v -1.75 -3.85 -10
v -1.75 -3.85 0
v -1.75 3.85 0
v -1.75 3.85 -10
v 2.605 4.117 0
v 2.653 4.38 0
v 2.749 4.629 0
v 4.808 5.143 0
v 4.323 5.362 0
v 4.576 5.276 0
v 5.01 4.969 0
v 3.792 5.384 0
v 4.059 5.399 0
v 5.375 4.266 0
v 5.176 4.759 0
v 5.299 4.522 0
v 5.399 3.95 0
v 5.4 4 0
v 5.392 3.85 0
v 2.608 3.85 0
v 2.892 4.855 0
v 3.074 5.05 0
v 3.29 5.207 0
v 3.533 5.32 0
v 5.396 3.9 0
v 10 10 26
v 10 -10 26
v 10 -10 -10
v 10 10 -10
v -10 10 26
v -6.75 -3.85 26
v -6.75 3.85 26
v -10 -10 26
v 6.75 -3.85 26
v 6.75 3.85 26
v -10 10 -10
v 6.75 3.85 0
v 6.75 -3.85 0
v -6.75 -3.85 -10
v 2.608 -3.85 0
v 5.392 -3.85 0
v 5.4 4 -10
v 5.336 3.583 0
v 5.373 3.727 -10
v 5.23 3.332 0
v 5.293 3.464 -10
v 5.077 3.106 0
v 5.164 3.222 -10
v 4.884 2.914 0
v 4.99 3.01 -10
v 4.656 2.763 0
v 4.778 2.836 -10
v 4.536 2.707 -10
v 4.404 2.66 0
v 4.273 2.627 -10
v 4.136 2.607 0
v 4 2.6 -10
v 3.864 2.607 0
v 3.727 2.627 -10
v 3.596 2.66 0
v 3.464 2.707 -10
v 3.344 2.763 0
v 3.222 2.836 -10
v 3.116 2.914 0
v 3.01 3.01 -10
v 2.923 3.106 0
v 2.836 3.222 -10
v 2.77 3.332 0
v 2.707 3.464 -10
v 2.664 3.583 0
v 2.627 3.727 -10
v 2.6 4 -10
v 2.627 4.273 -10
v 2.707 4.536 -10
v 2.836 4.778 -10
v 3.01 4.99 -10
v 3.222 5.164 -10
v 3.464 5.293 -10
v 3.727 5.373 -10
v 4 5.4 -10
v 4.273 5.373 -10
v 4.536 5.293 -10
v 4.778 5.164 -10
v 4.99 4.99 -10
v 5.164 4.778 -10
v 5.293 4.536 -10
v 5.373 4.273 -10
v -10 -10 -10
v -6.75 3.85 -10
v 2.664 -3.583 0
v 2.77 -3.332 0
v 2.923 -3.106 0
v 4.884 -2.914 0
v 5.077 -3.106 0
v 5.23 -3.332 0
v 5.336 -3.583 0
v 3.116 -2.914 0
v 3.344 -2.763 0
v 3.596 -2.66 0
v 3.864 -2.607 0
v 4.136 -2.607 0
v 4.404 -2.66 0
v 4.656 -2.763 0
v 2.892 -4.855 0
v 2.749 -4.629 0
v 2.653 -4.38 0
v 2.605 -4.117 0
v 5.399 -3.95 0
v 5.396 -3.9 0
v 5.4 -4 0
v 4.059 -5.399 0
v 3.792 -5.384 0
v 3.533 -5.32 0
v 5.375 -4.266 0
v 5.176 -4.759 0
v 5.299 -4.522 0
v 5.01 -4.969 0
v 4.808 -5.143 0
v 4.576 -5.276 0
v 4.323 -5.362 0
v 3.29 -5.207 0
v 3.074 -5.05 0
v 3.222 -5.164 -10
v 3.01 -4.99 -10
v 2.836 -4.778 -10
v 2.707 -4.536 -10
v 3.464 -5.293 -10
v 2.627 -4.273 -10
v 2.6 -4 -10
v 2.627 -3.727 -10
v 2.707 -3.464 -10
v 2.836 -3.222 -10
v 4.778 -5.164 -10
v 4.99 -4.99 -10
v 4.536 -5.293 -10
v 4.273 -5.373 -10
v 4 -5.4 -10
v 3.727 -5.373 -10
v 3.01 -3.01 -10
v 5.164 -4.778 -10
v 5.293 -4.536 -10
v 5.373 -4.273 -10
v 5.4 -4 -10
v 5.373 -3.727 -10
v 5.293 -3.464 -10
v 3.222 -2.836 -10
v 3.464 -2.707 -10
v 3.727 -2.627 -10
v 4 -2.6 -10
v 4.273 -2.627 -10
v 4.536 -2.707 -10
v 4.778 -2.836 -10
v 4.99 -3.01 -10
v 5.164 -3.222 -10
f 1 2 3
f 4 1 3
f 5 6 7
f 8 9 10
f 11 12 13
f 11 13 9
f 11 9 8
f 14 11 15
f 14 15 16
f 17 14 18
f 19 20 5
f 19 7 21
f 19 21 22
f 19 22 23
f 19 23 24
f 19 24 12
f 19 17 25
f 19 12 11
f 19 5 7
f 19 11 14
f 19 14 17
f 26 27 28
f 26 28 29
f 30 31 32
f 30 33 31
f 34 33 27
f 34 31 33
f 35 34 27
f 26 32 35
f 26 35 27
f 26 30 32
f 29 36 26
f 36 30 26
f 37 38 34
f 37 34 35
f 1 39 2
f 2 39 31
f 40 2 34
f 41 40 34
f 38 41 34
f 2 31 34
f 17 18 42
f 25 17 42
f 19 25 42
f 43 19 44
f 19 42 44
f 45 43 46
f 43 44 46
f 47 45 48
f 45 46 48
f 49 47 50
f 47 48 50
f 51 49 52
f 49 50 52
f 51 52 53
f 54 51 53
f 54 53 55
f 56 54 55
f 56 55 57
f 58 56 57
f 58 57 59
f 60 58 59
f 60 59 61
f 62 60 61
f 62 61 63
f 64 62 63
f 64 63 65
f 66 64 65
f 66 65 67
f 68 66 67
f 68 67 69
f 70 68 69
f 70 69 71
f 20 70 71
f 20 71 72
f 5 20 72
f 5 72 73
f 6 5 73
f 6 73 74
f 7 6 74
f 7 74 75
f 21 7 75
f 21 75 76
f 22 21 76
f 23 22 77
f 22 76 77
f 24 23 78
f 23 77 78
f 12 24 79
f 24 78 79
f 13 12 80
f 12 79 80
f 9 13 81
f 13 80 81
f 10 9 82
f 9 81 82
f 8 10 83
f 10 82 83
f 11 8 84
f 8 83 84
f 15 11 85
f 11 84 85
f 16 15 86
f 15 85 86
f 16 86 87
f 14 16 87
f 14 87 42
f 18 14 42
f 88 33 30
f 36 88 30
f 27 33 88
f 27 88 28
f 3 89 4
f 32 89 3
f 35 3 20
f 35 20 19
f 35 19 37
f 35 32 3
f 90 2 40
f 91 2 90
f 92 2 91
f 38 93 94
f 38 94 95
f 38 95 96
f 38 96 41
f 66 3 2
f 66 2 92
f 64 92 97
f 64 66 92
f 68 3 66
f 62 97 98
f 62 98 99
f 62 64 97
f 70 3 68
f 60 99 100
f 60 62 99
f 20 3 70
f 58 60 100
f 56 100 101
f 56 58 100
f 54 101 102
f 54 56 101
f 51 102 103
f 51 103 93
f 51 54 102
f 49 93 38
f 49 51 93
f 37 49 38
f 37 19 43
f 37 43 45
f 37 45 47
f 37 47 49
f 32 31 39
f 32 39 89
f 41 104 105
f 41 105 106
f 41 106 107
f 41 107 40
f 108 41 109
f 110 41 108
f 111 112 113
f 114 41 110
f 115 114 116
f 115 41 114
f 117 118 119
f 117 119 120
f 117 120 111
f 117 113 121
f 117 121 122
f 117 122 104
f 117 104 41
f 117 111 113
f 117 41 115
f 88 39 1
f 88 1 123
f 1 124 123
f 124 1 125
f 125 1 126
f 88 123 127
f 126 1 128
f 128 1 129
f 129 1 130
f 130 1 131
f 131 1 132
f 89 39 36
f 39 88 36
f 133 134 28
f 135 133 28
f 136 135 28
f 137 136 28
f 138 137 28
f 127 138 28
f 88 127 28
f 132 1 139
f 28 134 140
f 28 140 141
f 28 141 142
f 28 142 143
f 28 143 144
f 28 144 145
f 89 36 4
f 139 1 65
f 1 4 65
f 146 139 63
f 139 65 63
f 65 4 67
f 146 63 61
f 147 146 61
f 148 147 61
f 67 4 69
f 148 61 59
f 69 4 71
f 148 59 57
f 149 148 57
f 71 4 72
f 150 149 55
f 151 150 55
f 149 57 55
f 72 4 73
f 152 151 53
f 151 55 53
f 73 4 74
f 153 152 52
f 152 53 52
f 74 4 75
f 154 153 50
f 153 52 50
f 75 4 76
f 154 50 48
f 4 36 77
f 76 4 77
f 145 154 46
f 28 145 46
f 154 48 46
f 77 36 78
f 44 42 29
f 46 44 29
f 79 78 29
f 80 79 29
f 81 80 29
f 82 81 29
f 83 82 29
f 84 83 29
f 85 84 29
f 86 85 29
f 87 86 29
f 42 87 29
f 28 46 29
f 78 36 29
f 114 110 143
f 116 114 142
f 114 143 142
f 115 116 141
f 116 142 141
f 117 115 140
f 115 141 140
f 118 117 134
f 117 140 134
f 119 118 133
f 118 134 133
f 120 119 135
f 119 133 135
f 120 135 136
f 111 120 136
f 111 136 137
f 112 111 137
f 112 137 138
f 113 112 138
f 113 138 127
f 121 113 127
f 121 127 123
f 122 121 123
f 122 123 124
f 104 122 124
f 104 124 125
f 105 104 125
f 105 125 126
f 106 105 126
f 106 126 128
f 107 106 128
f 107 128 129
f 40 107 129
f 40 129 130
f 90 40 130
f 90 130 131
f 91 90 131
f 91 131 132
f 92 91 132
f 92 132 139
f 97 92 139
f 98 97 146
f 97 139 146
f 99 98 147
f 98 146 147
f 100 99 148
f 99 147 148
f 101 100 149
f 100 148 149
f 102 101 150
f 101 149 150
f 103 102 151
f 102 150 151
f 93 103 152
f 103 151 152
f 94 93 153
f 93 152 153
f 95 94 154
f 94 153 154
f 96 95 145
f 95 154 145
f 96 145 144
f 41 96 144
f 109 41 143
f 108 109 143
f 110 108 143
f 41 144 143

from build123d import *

# Parameters (mm, degrees)
F0_W     = 20
F0_H     = 20
F0_W_2   = 13.5
F0_H_2   = 7.7
F1_DEPTH = 26
F2_W     = 20
F2_H     = 20
F2_W_2   = 5
F2_H_2   = 7.7
F3_DEPTH = 10
F4_R     = 1.4
F5_DEPTH = 10


with BuildPart() as f1:
    # F0 (on Top) → F1 (new body)
    with BuildSketch(Plane.XY):
        Rectangle(F0_W, F0_H)
        Rectangle(F0_W_2, F0_H_2, mode=Mode.SUBTRACT)
    extrude(amount=F1_DEPTH)

    # F2 (on Top) → F3 (join)
    with BuildSketch(Plane.XY):
        Rectangle(F2_W, F2_H)
        with Locations((-4.25, 0)):
            Rectangle(F2_W_2, F2_H_2, mode=Mode.SUBTRACT)
    extrude(amount=-F3_DEPTH)

    # F4 (on face) → F5 (cut)
    with BuildSketch(Plane(origin=(0, 0, -10), x_dir=(1, 0, 0), z_dir=(0, 0, -1))):
        with Locations((4, 4)):
            Circle(F4_R)
        with Locations((4, -4)):
            Circle(F4_R)
    extrude(amount=-F5_DEPTH, mode=Mode.SUBTRACT)


solid = f1.part
